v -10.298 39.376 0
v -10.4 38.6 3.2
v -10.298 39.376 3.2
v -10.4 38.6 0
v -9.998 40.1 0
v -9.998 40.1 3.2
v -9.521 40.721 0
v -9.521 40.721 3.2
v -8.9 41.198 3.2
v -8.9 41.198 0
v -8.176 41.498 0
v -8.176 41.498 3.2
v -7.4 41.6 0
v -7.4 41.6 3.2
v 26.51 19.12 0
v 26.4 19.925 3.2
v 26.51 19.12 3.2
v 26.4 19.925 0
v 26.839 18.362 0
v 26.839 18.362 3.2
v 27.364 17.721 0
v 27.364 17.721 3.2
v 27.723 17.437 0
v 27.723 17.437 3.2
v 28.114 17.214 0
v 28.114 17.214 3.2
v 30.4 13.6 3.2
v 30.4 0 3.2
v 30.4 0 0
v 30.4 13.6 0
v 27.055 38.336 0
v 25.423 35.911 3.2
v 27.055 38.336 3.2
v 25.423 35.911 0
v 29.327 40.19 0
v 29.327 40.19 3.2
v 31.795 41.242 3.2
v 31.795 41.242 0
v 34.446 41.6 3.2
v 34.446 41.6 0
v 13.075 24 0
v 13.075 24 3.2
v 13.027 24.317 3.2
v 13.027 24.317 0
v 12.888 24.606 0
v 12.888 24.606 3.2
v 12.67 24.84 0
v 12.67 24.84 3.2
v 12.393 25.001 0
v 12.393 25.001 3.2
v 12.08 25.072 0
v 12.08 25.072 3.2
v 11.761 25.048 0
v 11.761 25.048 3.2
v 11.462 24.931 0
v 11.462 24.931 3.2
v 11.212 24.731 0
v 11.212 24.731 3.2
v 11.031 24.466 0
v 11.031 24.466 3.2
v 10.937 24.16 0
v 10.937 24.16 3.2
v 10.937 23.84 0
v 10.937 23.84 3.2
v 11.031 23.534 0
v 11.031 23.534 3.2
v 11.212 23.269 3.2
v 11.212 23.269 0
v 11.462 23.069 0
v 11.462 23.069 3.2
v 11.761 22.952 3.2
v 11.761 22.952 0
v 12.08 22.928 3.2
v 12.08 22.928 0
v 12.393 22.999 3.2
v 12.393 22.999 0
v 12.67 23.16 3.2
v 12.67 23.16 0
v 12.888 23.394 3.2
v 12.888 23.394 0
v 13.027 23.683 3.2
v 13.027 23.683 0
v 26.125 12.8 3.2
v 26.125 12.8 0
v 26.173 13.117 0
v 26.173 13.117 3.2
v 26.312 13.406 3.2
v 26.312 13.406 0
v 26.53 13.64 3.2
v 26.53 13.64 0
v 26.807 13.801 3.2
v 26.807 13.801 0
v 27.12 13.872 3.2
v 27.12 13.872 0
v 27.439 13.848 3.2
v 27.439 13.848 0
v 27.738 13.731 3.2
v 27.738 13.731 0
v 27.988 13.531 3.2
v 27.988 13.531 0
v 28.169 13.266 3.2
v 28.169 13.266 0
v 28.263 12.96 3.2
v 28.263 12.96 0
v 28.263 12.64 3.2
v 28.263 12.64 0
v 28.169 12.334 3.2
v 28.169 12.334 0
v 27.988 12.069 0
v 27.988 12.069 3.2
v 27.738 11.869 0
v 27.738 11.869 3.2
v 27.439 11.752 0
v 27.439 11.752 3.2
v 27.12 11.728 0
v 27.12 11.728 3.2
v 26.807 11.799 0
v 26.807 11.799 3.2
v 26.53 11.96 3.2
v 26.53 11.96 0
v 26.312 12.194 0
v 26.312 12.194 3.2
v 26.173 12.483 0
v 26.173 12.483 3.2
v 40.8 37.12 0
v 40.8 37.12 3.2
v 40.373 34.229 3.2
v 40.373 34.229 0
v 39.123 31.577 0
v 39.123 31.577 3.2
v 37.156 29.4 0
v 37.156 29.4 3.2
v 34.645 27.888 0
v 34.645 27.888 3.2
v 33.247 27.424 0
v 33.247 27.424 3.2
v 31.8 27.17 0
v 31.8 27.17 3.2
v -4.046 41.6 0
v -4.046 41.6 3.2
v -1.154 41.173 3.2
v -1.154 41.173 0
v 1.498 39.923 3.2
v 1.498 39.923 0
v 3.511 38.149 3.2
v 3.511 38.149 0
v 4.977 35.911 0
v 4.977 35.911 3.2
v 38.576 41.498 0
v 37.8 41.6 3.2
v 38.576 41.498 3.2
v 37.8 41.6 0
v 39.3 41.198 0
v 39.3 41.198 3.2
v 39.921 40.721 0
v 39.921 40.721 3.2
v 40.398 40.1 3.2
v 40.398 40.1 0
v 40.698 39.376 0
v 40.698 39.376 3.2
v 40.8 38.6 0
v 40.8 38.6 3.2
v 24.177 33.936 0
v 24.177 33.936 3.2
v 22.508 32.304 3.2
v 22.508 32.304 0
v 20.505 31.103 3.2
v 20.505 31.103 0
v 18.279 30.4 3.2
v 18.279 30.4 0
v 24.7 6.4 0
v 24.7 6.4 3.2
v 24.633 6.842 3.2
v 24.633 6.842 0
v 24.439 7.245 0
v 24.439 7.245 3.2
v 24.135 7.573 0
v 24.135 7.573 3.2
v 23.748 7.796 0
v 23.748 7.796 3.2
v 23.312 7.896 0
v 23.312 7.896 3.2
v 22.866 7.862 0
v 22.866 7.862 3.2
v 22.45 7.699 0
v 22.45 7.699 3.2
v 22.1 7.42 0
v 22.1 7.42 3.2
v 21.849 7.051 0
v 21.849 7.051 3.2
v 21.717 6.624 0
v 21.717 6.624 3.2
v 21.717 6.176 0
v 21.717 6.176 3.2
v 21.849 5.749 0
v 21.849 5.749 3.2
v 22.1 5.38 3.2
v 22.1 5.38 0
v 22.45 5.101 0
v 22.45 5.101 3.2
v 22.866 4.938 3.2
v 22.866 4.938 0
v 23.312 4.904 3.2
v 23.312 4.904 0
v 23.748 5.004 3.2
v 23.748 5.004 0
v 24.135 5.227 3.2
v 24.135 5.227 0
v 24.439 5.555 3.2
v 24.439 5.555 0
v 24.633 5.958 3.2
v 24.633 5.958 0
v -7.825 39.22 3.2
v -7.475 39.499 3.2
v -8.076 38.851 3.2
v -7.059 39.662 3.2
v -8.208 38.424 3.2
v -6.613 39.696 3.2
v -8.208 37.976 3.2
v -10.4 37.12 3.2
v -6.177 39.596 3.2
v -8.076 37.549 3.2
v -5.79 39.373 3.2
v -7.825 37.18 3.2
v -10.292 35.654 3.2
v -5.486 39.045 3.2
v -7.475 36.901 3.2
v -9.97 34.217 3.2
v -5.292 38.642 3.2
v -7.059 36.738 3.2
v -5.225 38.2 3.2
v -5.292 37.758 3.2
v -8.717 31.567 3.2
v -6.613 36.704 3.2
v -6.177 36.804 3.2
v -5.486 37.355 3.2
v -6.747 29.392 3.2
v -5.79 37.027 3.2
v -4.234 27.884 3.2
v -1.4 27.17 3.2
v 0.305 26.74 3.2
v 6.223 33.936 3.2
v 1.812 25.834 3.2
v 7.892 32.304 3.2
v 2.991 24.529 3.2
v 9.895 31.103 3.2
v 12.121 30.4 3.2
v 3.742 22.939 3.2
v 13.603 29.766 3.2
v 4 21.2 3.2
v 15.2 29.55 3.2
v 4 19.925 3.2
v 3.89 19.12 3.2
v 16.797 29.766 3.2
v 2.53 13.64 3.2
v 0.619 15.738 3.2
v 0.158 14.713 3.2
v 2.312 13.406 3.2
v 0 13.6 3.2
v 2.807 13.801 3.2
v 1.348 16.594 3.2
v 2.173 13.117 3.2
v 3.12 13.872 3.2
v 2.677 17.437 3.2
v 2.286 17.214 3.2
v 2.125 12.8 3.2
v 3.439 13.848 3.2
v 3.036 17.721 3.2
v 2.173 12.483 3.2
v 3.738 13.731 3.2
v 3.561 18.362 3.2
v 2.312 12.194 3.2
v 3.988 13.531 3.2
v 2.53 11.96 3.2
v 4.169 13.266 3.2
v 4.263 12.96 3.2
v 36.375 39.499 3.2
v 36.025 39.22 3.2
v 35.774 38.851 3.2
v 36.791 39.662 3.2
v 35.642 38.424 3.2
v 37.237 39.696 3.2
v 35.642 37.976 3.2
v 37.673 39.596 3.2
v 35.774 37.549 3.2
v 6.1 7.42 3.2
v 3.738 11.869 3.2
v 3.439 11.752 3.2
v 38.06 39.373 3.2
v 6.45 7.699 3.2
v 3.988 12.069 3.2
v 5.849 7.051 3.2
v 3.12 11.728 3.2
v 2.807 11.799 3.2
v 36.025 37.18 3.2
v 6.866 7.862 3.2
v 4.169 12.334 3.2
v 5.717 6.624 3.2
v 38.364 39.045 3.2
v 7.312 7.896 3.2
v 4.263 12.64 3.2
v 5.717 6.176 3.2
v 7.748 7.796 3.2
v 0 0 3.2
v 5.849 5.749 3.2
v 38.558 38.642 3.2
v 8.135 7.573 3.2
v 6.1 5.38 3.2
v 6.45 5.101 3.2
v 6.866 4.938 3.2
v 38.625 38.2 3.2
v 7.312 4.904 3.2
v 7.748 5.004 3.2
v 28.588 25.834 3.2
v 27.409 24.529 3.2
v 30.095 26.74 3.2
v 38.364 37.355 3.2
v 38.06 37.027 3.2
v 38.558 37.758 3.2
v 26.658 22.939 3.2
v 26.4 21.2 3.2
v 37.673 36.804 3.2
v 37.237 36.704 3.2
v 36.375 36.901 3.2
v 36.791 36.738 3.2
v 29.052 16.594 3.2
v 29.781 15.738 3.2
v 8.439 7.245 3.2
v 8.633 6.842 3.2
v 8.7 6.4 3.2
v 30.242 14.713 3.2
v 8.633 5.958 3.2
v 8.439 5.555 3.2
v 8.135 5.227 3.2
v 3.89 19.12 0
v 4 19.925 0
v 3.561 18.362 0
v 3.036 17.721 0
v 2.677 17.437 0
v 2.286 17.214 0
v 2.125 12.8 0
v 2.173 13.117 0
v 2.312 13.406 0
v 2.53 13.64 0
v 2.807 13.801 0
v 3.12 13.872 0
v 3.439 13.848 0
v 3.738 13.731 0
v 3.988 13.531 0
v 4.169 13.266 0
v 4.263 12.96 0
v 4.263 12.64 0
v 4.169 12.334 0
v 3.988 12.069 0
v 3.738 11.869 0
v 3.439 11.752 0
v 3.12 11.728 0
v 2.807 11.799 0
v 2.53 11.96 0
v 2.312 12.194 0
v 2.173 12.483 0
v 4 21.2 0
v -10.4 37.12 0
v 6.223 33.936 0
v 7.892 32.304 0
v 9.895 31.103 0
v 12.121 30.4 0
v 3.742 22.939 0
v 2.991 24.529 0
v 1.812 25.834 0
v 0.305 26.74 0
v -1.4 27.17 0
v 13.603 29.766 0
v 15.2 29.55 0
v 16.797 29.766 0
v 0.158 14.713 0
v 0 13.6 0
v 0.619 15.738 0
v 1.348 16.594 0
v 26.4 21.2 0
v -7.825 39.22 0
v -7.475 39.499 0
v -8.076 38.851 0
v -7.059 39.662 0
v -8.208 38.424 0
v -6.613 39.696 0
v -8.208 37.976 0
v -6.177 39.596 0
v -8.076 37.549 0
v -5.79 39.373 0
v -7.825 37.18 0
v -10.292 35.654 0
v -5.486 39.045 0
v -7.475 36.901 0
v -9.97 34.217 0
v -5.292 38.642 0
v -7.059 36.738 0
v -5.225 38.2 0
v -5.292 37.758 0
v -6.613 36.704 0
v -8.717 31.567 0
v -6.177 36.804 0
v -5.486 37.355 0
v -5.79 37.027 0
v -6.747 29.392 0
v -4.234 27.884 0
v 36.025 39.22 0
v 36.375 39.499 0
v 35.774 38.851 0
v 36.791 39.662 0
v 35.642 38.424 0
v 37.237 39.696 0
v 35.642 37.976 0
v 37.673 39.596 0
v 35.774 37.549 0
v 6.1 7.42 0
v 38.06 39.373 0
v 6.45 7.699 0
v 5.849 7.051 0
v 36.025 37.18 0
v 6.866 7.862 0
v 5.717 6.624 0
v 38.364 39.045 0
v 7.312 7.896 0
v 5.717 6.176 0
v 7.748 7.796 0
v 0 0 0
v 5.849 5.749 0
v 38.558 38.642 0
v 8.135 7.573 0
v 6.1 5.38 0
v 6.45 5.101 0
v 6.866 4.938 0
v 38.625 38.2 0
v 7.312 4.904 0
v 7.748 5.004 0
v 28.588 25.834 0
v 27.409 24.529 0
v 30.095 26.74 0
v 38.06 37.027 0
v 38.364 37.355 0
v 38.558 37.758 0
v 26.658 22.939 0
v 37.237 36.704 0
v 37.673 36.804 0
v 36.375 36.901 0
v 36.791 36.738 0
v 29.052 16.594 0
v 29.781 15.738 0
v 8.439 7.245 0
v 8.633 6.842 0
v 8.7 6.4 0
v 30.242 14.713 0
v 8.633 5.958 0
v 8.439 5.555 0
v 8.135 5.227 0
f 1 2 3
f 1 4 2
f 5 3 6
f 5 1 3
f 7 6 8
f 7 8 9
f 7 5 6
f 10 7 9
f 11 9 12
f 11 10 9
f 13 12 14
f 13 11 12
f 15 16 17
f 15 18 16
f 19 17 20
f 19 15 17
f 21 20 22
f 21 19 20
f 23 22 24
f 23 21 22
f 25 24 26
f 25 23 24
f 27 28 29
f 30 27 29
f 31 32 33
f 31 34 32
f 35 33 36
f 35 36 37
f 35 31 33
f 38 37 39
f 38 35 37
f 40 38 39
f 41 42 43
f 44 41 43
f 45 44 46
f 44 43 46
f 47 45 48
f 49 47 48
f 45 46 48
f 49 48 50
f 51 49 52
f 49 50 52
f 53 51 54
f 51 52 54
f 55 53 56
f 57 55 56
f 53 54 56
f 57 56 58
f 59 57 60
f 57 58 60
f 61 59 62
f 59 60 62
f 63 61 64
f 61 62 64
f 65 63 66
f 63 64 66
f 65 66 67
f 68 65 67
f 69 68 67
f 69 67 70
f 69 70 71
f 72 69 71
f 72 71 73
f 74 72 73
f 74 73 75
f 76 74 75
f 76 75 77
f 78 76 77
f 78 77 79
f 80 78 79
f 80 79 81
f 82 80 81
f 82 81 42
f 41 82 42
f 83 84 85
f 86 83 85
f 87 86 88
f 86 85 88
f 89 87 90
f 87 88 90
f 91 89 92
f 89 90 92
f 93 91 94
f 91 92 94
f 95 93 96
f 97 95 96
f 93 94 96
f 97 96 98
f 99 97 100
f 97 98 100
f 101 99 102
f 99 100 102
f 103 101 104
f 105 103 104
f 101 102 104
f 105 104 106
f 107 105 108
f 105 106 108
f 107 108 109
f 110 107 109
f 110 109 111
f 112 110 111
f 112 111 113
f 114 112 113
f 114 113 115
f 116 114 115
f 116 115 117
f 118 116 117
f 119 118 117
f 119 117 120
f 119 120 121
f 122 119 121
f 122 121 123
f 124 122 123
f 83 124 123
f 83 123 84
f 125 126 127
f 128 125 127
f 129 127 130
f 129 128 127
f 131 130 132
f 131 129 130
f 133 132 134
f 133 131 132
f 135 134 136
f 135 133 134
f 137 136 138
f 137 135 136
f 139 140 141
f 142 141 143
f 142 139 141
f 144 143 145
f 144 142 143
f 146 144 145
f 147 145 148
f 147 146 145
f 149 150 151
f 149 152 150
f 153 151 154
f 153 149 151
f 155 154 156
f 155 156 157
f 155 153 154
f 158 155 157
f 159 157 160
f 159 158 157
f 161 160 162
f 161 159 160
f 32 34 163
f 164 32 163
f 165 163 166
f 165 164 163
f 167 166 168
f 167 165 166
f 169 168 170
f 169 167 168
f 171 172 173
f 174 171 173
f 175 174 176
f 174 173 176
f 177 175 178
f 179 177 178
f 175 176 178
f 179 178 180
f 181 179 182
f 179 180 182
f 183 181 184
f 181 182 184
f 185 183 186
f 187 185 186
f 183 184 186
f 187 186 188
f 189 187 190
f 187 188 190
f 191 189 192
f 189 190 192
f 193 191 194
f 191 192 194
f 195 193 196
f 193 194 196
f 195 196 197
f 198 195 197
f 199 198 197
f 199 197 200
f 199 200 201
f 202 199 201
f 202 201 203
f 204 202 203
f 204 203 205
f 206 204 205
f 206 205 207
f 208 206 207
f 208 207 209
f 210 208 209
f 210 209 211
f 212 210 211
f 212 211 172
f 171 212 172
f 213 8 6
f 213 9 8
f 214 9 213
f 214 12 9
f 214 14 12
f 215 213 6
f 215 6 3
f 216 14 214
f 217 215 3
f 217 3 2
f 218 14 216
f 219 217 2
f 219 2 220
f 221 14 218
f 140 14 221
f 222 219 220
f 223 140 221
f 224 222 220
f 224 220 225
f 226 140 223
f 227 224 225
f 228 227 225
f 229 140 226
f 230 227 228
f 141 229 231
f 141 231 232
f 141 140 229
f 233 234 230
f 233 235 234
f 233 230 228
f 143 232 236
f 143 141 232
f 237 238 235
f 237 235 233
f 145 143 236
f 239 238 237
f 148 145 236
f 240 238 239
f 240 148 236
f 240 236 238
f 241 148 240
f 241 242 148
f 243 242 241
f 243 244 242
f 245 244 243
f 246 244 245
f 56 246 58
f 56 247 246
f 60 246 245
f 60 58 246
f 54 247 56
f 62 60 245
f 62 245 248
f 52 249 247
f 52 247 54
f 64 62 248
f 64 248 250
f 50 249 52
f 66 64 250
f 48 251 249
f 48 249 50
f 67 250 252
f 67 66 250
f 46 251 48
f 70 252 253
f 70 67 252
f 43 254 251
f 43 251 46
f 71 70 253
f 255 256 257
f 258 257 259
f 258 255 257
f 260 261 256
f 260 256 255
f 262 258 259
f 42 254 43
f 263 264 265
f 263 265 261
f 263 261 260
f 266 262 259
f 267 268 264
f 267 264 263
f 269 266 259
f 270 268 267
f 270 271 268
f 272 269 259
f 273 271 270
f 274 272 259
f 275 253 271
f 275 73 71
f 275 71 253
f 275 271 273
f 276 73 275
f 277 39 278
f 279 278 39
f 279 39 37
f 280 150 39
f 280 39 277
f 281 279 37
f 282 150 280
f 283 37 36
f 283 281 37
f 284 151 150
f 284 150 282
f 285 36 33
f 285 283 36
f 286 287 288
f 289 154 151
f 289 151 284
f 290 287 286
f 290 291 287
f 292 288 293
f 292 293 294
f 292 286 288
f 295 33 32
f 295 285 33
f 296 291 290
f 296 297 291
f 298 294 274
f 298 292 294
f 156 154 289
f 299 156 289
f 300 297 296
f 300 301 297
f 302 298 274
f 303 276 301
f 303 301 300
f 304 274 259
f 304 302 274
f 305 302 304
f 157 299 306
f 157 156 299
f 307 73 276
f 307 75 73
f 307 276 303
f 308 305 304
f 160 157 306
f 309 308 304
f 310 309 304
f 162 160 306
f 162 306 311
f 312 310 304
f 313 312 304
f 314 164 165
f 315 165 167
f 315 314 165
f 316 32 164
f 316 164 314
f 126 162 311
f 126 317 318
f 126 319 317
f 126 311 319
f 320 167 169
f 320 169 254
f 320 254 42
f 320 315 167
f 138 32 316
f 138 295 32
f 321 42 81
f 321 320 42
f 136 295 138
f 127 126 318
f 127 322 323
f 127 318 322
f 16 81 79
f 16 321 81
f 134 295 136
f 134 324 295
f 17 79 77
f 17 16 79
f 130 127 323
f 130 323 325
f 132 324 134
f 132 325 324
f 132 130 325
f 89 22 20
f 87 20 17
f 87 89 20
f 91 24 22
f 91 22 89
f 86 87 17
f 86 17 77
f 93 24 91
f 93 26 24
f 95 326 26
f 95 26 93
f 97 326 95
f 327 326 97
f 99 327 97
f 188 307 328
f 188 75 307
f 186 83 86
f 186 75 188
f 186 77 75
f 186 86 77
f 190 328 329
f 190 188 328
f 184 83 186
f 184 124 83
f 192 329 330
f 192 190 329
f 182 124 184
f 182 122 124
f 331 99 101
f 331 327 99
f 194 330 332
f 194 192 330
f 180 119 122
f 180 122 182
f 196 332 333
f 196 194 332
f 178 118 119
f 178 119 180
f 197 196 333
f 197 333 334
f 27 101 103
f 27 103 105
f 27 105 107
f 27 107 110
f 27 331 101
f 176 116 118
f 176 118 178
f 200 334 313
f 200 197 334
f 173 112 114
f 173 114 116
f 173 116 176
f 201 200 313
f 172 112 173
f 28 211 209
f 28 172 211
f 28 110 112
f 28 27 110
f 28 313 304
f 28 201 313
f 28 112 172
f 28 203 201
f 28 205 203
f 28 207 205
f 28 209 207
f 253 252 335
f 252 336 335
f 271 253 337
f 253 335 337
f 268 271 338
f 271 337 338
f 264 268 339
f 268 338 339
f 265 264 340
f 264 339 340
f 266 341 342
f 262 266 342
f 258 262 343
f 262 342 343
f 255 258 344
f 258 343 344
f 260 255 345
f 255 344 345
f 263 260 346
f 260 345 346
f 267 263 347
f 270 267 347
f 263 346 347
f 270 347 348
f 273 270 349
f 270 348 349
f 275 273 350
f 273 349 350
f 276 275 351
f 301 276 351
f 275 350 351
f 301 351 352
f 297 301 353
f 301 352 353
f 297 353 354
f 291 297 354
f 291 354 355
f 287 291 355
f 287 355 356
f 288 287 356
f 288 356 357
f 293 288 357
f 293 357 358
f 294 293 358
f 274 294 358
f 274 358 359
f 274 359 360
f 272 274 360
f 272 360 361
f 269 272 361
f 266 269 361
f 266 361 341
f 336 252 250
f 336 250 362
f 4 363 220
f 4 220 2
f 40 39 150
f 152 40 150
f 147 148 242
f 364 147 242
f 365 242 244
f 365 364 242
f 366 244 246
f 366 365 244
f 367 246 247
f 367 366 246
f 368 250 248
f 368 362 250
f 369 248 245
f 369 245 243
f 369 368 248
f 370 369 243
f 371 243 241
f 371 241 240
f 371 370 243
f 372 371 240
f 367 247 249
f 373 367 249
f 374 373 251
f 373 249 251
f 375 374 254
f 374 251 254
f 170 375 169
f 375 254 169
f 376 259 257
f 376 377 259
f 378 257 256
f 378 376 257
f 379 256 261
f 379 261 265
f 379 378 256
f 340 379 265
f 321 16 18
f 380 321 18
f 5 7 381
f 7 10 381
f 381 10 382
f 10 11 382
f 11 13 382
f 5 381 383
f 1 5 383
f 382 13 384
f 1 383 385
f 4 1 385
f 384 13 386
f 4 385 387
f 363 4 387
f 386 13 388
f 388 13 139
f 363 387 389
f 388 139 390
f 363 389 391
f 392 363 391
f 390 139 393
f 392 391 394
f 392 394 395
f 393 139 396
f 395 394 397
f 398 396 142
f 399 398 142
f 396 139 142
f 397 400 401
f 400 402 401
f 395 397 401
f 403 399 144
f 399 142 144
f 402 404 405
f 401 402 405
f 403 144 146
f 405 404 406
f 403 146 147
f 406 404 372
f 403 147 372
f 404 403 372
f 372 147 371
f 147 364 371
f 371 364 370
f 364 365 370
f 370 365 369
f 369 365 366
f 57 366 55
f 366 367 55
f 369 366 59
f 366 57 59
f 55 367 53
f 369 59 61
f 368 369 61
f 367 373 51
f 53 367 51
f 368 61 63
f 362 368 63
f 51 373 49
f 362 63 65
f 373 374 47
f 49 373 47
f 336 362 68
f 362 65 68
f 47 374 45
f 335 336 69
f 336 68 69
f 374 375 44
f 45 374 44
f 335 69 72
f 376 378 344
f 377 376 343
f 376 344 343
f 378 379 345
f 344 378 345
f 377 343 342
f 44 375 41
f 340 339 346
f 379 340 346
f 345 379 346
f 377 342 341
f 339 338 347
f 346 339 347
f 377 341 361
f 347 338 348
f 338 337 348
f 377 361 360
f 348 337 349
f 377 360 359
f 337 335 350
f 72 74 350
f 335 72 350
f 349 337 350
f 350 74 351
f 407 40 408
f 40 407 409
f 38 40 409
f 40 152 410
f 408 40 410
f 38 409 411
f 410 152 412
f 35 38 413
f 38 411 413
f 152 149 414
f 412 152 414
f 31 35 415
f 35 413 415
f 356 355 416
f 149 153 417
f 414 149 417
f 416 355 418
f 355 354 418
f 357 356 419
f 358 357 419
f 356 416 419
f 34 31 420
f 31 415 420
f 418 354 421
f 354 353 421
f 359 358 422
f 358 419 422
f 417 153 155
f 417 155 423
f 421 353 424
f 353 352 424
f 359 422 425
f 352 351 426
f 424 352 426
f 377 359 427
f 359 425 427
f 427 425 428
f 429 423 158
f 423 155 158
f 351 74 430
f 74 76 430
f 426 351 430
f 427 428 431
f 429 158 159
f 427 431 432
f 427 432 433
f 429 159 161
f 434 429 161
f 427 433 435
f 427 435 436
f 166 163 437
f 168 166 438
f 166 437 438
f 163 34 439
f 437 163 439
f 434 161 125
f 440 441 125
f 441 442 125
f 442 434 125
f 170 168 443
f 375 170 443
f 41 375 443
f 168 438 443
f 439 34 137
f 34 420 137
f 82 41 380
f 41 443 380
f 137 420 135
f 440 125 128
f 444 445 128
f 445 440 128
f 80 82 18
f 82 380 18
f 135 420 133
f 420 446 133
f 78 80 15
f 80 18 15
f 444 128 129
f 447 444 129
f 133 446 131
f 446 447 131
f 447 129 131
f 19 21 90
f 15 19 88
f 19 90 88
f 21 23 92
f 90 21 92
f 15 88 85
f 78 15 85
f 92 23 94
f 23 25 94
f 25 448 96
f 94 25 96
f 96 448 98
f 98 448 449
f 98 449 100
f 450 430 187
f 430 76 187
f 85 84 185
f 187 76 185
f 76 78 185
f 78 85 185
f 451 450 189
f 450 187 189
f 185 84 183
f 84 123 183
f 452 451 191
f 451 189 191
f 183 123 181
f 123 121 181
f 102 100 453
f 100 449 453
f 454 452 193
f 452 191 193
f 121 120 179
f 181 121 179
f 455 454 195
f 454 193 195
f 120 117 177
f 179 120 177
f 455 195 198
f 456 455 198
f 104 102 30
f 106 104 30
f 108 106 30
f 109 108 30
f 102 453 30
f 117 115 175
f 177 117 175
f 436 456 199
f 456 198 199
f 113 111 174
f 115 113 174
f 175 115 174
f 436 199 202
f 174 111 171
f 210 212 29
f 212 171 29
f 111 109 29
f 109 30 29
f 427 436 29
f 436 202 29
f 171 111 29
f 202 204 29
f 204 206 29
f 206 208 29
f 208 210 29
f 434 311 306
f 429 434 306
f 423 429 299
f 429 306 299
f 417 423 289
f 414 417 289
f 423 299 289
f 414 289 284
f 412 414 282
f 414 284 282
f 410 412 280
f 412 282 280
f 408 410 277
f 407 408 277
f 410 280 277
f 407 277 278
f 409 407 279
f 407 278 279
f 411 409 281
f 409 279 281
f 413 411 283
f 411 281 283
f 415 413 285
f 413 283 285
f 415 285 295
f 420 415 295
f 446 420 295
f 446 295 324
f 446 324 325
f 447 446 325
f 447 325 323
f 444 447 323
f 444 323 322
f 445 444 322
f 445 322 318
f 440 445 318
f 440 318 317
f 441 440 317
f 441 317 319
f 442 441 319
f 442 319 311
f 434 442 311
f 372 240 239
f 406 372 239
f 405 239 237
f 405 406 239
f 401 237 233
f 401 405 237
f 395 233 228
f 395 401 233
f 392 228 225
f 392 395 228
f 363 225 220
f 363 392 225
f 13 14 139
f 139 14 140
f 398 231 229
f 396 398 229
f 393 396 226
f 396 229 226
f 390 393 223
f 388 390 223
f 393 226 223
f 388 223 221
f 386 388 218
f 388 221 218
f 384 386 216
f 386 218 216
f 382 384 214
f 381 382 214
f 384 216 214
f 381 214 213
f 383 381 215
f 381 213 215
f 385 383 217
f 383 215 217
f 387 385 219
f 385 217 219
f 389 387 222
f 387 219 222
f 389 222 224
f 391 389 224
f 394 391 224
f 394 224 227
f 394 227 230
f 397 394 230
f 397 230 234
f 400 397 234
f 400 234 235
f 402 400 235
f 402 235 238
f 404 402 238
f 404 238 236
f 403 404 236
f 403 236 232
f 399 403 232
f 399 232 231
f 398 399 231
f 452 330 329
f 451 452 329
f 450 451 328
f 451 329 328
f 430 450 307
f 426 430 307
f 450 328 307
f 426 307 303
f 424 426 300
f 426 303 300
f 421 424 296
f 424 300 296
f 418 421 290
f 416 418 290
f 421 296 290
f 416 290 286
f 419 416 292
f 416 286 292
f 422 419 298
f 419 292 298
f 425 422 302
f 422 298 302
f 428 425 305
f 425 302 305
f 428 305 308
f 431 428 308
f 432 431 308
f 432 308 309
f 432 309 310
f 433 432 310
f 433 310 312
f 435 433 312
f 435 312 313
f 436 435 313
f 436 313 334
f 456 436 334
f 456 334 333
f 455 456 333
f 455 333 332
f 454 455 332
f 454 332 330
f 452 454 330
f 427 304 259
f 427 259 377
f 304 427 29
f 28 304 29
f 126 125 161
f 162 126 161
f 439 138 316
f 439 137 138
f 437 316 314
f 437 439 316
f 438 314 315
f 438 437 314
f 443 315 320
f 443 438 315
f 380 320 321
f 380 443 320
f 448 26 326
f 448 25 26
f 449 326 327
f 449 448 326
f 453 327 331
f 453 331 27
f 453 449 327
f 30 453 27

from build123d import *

# Parameters (mm, degrees)
SKETCH1_W           = 30.4
SKETCH1_H           = 3.2
BOSS_EXTRUDE1_DEPTH = 17.6
SKETCH2_R           = 1.5
CUT_EXTRUDE1_DEPTH  = 16
SKETCH3_R           = 1.075
CUT_EXTRUDE2_DEPTH  = 16
SKETCH4_W           = 22.4
SKETCH4_H           = 3.2
BOSS_EXTRUDE2_DEPTH = 12.8
SKETCH5_R           = 1.075
CUT_EXTRUDE3_DEPTH  = 16
SKETCH6_W           = 14.4
SKETCH6_H           = 14.4
BOSS_EXTRUDE3_DEPTH = 3.2
SKETCH7_R           = 1.5
CUT_EXTRUDE4_DEPTH  = 59.356147919
SKETCH8_R           = 6
CUT_EXTRUDE5_DEPTH  = 3.2
FILLET5_R           = 4
FILLET6_R           = 10
FILLET7_R           = 6
FILLET8_R           = 10
FILLET9_R           = 3
FILLET10_R          = 10
FILLET12_R          = 3


# Some blends are built 0.0001 mm under size
with BuildPart() as part:
    # Sketch1 → Boss-Extrude1 (new body)
    with BuildSketch(Plane(origin=(0, 0, 0), x_dir=(1, 0, 0), z_dir=(0, 1, 0))):
        with Locations((15.2, -1.6)):
            Rectangle(SKETCH1_W, SKETCH1_H)
    extrude(amount=BOSS_EXTRUDE1_DEPTH)

    # Sketch2 → Cut-Extrude1 (cut)
    with BuildSketch(Plane.XY.offset(3.2)):
        with Locations((23.2, 6.4)):
            Circle(SKETCH2_R)
        with Locations((7.2, 6.4)):
            Circle(SKETCH2_R)
    extrude(amount=-CUT_EXTRUDE1_DEPTH, mode=Mode.SUBTRACT)

    # Sketch3 → Cut-Extrude2 (cut)
    with BuildSketch(Plane(origin=(0, 0, 0), x_dir=(-1, 0, 0), z_dir=(0, 0, -1))):
        with Locations((-27.2, 12.8)):
            Circle(SKETCH3_R)
        with Locations((-3.2, 12.8)):
            Circle(SKETCH3_R)
    extrude(amount=-CUT_EXTRUDE2_DEPTH, mode=Mode.SUBTRACT)

    # Sketch4 → Boss-Extrude2 (add)
    with BuildSketch(Plane(origin=(0, 17.6, 0), x_dir=(1, 0, 0), z_dir=(0, 1, 0))):
        with Locations((15.2, -1.6)):
            Rectangle(SKETCH4_W, SKETCH4_H)
    extrude(amount=BOSS_EXTRUDE2_DEPTH)

    # Sketch5 → Cut-Extrude3 (cut)
    with BuildSketch(Plane.XY.offset(3.2)):
        with Locations((12, 24)):
            Circle(SKETCH5_R)
    extrude(amount=-CUT_EXTRUDE3_DEPTH, mode=Mode.SUBTRACT)

    # Sketch6 → Boss-Extrude3 (add)
    with BuildSketch(Plane.XY.offset(3.2)):
        with Locations((-3.2, 34.4)):
            Rectangle(SKETCH6_W, SKETCH6_H)
        with Locations((33.6, 34.4)):
            Rectangle(SKETCH6_W, SKETCH6_H)
    extrude(amount=-BOSS_EXTRUDE3_DEPTH)

    # Sketch7 → Cut-Extrude4 (cut, through all)
    with BuildSketch(Plane.XY.offset(3.2)):
        with Locations((-6.725, 38.2)):
            Circle(SKETCH7_R)
        with Locations((37.125, 38.2)):
            Circle(SKETCH7_R)
    extrude(amount=-CUT_EXTRUDE4_DEPTH, mode=Mode.SUBTRACT)

    # Sketch8 → Cut-Extrude5 (cut)
    with BuildSketch(Plane.XY.offset(3.2)):
        with Locations((15.2, 35.549818305)):
            Circle(SKETCH8_R)
    extrude(amount=-CUT_EXTRUDE5_DEPTH, mode=Mode.SUBTRACT)

    # Fillet5
    fillet5_edges = [part.edges().sort_by_distance(p)[0] for p in [
        (0, 17.6, 1.6),
        (30.4, 17.6, 1.6),
    ]]
    fillet(fillet5_edges, radius=FILLET5_R - 0.0001)  # a hair under: the kernel refuses the full size

    # Fillet6
    # the kernel refuses this fillet: 10 mm, written as the material it adds along each edge
    with BuildSketch(Plane(origin=(26.4, 30.4, 3.2), x_dir=(0, 1, 0), z_dir=(0, 0, -1)), Plane(origin=(4, 30.4, 0), x_dir=(0, 1, 0), z_dir=(0, 0, 1))) as fillet6_piece_1:
        with BuildLine():
            CenterArc((9.821908657, -10), FILLET6_R, 90, 79.170567871)
            Line((0, -8.121141214), (-0.196438173, -8.083564039))
            ThreePointArc((-0.196438173, -8.083564039), (-0.2, -4.060570607), (-0.2, 0))
            Line((-0.2, 0), (0, 0.2))
            Line((0, 0.2), (9.821908657, 0.2))
            Line((9.821908657, 0.2), (9.821908657, 0))
        make_face()
    extrude(amount=3.2)

    # Fillet7
    fillet7_edges = [part.edges().sort_by_distance(p)[0] for p in [
        (4, 27.2, 1.6),
        (26.4, 27.2, 1.6),
    ]]
    fillet(fillet7_edges, radius=FILLET7_R)

    # Fillet8
    fillet8_edges = [part.edges().sort_by_distance(p)[0] for p in [
        (40.8, 27.2, 1.6),
        (-10.4, 27.2, 1.6),
    ]]
    fillet(fillet8_edges, radius=FILLET8_R)

    # Fillet9
    fillet9_edges = [part.edges().sort_by_distance(p)[0] for p in [
        (-10.4, 41.6, 1.6),
        (40.8, 41.6, 1.6),
    ]]
    fillet(fillet9_edges, radius=FILLET9_R)

    # Fillet10
    fillet10_edges = [part.edges().sort_by_distance(p)[0] for p in [
        (26.4, 41.6, 1.6),
        (4, 41.6, 1.6),
    ]]
    fillet(fillet10_edges, radius=FILLET10_R)

    # Fillet12
    fillet12_edges = [part.edges().sort_by_distance(p)[0] for p in [
        (4, 17.6, 1.6),
        (26.4, 17.6, 1.6),
    ]]
    fillet(fillet12_edges, radius=FILLET12_R)


solid = part.part
